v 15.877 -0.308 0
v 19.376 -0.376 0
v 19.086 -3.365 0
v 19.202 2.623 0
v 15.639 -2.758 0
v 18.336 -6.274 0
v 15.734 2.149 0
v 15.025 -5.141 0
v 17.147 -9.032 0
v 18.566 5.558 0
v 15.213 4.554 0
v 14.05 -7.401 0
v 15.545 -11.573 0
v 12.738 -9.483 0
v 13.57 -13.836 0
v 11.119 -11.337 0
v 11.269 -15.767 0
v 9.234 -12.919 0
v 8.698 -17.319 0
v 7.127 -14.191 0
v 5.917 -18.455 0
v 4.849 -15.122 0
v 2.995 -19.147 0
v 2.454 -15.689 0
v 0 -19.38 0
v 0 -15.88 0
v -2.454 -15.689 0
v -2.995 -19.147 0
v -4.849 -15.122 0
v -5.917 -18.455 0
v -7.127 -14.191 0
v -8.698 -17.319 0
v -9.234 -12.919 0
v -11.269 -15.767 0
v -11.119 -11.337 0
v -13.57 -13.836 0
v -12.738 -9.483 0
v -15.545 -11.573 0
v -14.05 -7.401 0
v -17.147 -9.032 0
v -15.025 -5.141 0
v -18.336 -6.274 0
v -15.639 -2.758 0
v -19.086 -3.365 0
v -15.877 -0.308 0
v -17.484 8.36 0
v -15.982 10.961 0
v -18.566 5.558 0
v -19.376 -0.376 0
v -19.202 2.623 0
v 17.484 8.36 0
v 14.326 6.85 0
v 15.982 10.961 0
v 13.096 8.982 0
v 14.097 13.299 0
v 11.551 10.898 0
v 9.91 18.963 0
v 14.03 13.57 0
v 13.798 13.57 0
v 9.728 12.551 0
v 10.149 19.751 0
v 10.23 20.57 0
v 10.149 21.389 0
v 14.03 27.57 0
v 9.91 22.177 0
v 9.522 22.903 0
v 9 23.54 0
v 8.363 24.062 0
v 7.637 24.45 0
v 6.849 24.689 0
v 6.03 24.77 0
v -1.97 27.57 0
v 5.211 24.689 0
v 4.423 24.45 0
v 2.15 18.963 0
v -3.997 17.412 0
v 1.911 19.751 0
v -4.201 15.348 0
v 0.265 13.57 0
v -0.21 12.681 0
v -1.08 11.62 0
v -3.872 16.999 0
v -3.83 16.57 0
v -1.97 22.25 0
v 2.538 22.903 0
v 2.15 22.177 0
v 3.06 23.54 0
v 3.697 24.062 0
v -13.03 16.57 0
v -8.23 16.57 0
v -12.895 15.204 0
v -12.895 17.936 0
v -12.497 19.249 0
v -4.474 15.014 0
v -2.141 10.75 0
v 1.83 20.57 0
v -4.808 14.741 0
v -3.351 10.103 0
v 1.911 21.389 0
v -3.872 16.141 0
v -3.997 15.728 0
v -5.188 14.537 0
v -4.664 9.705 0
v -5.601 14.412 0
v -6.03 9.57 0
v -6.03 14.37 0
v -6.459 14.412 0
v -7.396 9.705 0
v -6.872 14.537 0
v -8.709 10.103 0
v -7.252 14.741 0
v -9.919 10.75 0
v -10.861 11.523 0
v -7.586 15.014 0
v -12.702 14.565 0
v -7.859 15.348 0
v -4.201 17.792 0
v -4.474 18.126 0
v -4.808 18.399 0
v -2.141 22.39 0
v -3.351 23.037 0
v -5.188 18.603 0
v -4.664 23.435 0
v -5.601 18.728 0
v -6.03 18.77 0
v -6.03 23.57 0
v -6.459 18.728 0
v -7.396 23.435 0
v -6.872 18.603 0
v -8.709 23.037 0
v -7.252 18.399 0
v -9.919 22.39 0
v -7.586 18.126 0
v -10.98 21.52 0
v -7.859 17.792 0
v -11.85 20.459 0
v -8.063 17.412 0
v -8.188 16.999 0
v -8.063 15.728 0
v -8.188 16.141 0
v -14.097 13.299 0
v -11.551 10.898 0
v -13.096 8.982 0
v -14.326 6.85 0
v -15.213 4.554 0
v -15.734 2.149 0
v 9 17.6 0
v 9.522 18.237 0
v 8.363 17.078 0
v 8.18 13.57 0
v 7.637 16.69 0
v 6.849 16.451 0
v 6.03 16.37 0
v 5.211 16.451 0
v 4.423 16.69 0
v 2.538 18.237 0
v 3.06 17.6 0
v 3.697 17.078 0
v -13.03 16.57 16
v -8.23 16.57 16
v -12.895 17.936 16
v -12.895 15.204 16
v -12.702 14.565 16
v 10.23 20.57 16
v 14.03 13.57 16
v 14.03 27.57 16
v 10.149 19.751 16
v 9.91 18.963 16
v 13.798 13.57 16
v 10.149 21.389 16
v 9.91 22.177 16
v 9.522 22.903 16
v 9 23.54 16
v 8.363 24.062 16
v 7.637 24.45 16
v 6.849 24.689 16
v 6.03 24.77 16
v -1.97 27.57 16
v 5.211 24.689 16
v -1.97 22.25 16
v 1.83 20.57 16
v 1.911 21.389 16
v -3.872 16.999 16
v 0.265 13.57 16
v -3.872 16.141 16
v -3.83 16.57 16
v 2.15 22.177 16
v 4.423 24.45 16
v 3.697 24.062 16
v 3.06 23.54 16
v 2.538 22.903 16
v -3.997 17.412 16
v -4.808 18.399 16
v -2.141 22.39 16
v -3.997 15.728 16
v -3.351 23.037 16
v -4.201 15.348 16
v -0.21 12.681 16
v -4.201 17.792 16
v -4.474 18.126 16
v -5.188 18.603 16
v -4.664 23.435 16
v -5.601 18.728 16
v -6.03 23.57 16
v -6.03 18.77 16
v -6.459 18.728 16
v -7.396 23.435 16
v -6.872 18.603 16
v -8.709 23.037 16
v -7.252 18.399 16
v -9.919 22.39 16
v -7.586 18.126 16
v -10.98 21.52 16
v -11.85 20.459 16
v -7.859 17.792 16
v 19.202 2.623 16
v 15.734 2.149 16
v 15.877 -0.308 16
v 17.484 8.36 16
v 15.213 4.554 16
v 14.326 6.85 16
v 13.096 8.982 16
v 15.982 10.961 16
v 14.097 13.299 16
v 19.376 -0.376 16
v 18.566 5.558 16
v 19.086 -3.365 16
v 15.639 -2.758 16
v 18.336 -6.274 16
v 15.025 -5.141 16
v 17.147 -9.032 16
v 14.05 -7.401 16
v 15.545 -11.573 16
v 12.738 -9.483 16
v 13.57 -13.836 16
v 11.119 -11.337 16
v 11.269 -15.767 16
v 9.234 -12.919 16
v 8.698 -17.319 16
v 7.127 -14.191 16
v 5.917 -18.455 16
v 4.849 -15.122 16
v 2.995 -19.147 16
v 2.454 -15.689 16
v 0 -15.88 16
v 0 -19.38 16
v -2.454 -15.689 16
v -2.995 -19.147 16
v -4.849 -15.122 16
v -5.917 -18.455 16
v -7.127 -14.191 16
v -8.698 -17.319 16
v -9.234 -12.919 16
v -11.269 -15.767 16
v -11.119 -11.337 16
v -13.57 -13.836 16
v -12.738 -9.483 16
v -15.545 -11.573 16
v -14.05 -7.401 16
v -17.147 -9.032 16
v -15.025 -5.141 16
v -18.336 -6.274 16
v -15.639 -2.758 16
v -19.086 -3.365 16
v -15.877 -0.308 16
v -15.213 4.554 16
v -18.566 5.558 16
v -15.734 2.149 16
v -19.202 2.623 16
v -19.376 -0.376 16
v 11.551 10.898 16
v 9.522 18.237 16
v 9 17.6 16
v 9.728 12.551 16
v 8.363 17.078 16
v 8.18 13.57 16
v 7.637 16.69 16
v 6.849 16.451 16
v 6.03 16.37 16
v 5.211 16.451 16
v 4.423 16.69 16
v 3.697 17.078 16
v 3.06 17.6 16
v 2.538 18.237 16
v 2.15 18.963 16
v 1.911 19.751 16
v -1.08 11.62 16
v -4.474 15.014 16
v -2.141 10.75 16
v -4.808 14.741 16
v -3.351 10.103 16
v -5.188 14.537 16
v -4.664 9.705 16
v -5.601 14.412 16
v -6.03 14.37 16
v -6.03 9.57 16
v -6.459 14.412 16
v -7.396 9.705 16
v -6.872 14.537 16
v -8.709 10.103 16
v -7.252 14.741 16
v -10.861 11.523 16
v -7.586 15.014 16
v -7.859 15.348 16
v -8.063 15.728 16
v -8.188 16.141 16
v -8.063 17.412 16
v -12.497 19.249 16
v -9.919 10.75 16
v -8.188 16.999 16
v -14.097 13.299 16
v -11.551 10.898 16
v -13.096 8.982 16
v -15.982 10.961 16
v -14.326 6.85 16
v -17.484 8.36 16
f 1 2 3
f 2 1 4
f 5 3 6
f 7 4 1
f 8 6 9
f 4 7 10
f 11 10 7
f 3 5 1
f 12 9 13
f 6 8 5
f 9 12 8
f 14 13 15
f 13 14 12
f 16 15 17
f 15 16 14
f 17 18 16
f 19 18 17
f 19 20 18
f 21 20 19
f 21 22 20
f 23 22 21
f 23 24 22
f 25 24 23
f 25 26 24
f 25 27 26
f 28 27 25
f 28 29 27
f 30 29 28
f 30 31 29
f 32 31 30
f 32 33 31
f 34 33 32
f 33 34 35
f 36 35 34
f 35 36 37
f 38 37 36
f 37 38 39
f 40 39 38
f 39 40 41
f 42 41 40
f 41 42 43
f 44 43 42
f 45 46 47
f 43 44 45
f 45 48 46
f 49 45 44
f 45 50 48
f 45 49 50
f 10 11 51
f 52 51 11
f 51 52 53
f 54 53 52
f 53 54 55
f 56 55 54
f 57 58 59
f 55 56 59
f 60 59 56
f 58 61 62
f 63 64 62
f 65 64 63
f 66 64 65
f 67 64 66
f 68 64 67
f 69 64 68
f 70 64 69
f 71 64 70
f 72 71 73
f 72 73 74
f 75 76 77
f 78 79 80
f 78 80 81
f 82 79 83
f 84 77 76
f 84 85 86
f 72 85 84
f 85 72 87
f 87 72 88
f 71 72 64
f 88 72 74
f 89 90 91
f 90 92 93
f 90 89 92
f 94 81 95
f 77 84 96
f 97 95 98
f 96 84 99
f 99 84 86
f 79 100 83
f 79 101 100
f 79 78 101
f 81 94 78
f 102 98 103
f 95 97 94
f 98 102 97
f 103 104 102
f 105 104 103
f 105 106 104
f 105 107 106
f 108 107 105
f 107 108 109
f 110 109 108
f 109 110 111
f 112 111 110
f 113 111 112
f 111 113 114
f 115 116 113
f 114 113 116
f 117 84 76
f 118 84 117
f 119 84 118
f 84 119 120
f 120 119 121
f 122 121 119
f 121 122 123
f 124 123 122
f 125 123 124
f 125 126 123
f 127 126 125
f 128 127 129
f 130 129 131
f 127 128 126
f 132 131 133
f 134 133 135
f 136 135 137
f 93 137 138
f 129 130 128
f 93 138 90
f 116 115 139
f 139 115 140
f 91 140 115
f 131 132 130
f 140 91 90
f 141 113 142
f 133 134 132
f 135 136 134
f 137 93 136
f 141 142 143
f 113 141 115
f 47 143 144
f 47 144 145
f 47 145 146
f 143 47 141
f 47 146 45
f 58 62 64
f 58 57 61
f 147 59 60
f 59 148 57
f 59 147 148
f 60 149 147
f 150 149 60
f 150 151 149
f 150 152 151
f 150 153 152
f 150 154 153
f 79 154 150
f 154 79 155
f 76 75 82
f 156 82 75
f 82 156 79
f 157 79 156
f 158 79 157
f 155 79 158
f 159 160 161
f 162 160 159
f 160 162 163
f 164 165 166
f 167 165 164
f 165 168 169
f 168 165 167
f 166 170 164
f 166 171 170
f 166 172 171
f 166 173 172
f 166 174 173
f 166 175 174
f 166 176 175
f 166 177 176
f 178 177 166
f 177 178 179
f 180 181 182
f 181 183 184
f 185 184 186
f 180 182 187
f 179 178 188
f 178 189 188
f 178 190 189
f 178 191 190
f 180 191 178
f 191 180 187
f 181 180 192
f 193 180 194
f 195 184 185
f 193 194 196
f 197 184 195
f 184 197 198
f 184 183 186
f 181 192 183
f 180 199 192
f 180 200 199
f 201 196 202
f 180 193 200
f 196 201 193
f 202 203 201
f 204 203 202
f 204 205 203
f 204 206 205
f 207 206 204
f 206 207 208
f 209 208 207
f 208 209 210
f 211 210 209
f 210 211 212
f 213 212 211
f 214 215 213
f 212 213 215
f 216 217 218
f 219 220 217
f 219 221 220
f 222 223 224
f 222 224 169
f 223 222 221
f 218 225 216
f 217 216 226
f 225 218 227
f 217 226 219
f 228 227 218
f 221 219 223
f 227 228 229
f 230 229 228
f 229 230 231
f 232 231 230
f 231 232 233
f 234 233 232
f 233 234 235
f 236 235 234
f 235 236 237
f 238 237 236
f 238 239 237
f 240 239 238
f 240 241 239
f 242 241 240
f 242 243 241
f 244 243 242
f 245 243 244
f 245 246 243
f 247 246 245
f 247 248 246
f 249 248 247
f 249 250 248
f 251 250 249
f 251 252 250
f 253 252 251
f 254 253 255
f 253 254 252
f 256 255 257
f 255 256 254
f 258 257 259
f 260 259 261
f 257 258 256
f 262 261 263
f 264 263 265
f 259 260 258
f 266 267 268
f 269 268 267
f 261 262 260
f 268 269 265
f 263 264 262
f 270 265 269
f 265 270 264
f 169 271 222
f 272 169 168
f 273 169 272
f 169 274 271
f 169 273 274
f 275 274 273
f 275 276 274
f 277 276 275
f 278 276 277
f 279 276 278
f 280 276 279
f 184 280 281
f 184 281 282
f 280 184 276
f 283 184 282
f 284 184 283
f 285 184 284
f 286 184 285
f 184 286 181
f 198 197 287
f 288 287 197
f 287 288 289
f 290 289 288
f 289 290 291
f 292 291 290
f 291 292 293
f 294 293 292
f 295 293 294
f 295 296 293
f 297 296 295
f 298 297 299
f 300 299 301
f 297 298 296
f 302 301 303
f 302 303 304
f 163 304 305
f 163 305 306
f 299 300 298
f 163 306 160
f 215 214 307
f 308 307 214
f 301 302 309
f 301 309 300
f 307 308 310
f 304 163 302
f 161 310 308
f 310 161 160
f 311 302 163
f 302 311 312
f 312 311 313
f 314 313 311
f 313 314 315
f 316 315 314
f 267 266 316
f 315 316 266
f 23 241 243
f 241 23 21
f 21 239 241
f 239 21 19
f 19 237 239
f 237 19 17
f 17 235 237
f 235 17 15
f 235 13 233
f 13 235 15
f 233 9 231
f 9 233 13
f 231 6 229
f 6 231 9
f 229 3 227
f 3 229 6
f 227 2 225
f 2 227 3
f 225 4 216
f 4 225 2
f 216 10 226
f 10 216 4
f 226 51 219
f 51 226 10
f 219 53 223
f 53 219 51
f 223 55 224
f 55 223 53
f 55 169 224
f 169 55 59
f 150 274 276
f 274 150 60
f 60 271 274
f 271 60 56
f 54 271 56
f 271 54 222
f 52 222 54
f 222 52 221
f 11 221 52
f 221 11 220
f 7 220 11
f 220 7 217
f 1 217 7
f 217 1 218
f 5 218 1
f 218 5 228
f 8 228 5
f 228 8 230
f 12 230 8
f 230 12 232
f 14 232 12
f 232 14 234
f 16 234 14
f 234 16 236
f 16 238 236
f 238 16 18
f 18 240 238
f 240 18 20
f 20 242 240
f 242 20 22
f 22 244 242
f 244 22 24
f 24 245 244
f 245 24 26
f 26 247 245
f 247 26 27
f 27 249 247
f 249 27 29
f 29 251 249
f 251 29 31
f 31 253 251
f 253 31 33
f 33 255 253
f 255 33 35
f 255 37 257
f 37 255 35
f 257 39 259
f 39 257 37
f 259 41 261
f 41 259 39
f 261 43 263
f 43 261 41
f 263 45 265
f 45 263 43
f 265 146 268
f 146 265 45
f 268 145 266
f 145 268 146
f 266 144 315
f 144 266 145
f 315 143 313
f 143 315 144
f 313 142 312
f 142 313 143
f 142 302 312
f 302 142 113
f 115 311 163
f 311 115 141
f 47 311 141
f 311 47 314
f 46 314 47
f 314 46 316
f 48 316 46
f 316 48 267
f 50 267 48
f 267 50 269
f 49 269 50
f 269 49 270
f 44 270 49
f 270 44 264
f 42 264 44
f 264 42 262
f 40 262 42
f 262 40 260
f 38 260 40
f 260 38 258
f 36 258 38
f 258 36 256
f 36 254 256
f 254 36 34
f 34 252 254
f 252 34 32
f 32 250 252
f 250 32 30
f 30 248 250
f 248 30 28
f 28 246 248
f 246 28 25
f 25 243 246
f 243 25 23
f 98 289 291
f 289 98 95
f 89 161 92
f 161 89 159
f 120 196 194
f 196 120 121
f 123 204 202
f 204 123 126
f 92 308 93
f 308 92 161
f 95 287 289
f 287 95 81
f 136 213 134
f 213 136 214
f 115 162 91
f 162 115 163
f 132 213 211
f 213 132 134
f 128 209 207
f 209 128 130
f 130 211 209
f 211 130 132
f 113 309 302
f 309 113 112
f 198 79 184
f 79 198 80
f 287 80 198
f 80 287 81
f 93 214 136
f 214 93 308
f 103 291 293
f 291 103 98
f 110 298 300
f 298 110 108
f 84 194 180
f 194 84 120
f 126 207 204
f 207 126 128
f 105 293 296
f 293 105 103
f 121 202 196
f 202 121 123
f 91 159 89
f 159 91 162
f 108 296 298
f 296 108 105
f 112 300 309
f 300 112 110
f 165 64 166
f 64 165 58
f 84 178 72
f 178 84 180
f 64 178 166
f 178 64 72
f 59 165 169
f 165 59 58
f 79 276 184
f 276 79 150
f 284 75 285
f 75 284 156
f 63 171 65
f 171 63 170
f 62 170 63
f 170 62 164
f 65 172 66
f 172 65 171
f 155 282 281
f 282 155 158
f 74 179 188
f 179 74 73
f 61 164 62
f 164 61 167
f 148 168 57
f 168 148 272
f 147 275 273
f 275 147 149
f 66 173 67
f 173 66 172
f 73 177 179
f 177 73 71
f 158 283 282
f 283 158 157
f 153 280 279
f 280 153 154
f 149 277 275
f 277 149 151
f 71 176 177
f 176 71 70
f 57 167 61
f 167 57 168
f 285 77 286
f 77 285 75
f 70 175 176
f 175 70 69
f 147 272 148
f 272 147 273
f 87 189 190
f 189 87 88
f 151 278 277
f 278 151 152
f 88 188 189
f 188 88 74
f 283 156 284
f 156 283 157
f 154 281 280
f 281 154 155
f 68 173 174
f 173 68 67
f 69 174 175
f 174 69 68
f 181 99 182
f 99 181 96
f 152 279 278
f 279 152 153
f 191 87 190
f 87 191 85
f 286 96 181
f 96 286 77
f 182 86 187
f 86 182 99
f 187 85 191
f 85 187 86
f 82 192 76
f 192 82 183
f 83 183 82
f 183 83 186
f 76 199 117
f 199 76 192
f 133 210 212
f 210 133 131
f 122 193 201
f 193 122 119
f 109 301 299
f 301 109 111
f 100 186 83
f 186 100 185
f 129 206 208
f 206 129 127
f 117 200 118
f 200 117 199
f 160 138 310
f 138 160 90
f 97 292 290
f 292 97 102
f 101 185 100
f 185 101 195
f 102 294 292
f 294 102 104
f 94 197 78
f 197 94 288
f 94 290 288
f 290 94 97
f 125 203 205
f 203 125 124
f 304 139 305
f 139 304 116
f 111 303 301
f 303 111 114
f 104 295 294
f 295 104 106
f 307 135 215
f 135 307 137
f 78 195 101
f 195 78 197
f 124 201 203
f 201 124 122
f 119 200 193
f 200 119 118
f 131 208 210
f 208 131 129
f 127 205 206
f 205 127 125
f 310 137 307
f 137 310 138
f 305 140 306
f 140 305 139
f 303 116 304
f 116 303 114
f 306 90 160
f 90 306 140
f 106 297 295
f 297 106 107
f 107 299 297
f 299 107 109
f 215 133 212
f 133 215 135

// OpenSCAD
$fn = 32;

// ----------------------------------------------------------------------
// Pipe clamp: 38.76 mm ring, 3.5 mm wall, 16 mm wide
// ----------------------------------------------------------------------

// --- parameters (mm) ---
outer_r = 19.38;          // clamp outside radius
inner_r = 15.88;          // pipe bore radius
band = 3.5;               // band thickness
clamp_w = 16;             // clamp width
opening = 40;             // opening angle between the ends
lug_w = 16;               // lug width
lug_len = 14;             // lug length
bolt_d = 8.4;             // bolt hole
knuckle_d = 14;           // hinge knuckle diameter
pin_d = 4.4;              // hinge pin hole

clamp_profile = [[-6.628, 18.211], [-9.363, 16.968], [-11.872, 15.318], [-14.097, 13.299], [-15.982, 10.961], [-17.484, 8.36], [-18.566, 5.558], [-19.202, 2.623], [-19.376, -0.376], [-19.086, -3.365], [-18.336, -6.274], [-17.147, -9.032], [-15.545, -11.573], [-13.57, -13.836], [-11.269, -15.767], [-8.698, -17.319], [-5.917, -18.455], [-2.995, -19.147], [0, -19.38], [2.995, -19.147], [5.917, -18.455], [8.698, -17.319], [11.269, -15.767], [13.57, -13.836], [15.545, -11.573], [17.147, -9.032], [18.336, -6.274], [19.086, -3.365], [19.376, -0.376], [19.202, 2.623], [18.566, 5.558], [17.484, 8.36], [15.982, 10.961], [14.097, 13.299], [11.872, 15.318], [9.363, 16.968], [6.628, 18.211], [5.431, 14.922], [7.672, 13.904], [9.728, 12.551], [11.551, 10.898], [13.096, 8.982], [14.326, 6.85], [15.213, 4.554], [15.734, 2.149], [15.877, -0.308], [15.639, -2.758], [15.025, -5.141], [14.05, -7.401], [12.738, -9.483], [11.119, -11.337], [9.234, -12.919], [7.127, -14.191], [4.849, -15.122], [2.454, -15.689], [0, -15.88], [-2.454, -15.689], [-4.849, -15.122], [-7.127, -14.191], [-9.234, -12.919], [-11.119, -11.337], [-12.738, -9.483], [-14.05, -7.401], [-15.025, -5.141], [-15.639, -2.758], [-15.877, -0.308], [-15.734, 2.149], [-15.213, 4.554], [-14.326, 6.85], [-13.096, 8.982], [-11.551, 10.898], [-9.728, 12.551], [-7.672, 13.904], [-5.431, 14.922]];

difference() {
  union() {
    linear_extrude(height = clamp_w) polygon(clamp_profile);
    /* hinge knuckle, sunk 2 mm into the band end */
    translate([-6.03, 16.57, 0]) cylinder(h = clamp_w, d = knuckle_d);
    /* bolt lug on the other end */
    translate([-1.97, 13.57, 0]) cube([lug_w, 14, clamp_w]);
  }
  translate([6.03, 20.57, -2.5]) cylinder(h = clamp_w + 5, d = bolt_d);
  translate([-6.03, 16.57, -2.5]) cylinder(h = clamp_w + 5, d = pin_d);
}
